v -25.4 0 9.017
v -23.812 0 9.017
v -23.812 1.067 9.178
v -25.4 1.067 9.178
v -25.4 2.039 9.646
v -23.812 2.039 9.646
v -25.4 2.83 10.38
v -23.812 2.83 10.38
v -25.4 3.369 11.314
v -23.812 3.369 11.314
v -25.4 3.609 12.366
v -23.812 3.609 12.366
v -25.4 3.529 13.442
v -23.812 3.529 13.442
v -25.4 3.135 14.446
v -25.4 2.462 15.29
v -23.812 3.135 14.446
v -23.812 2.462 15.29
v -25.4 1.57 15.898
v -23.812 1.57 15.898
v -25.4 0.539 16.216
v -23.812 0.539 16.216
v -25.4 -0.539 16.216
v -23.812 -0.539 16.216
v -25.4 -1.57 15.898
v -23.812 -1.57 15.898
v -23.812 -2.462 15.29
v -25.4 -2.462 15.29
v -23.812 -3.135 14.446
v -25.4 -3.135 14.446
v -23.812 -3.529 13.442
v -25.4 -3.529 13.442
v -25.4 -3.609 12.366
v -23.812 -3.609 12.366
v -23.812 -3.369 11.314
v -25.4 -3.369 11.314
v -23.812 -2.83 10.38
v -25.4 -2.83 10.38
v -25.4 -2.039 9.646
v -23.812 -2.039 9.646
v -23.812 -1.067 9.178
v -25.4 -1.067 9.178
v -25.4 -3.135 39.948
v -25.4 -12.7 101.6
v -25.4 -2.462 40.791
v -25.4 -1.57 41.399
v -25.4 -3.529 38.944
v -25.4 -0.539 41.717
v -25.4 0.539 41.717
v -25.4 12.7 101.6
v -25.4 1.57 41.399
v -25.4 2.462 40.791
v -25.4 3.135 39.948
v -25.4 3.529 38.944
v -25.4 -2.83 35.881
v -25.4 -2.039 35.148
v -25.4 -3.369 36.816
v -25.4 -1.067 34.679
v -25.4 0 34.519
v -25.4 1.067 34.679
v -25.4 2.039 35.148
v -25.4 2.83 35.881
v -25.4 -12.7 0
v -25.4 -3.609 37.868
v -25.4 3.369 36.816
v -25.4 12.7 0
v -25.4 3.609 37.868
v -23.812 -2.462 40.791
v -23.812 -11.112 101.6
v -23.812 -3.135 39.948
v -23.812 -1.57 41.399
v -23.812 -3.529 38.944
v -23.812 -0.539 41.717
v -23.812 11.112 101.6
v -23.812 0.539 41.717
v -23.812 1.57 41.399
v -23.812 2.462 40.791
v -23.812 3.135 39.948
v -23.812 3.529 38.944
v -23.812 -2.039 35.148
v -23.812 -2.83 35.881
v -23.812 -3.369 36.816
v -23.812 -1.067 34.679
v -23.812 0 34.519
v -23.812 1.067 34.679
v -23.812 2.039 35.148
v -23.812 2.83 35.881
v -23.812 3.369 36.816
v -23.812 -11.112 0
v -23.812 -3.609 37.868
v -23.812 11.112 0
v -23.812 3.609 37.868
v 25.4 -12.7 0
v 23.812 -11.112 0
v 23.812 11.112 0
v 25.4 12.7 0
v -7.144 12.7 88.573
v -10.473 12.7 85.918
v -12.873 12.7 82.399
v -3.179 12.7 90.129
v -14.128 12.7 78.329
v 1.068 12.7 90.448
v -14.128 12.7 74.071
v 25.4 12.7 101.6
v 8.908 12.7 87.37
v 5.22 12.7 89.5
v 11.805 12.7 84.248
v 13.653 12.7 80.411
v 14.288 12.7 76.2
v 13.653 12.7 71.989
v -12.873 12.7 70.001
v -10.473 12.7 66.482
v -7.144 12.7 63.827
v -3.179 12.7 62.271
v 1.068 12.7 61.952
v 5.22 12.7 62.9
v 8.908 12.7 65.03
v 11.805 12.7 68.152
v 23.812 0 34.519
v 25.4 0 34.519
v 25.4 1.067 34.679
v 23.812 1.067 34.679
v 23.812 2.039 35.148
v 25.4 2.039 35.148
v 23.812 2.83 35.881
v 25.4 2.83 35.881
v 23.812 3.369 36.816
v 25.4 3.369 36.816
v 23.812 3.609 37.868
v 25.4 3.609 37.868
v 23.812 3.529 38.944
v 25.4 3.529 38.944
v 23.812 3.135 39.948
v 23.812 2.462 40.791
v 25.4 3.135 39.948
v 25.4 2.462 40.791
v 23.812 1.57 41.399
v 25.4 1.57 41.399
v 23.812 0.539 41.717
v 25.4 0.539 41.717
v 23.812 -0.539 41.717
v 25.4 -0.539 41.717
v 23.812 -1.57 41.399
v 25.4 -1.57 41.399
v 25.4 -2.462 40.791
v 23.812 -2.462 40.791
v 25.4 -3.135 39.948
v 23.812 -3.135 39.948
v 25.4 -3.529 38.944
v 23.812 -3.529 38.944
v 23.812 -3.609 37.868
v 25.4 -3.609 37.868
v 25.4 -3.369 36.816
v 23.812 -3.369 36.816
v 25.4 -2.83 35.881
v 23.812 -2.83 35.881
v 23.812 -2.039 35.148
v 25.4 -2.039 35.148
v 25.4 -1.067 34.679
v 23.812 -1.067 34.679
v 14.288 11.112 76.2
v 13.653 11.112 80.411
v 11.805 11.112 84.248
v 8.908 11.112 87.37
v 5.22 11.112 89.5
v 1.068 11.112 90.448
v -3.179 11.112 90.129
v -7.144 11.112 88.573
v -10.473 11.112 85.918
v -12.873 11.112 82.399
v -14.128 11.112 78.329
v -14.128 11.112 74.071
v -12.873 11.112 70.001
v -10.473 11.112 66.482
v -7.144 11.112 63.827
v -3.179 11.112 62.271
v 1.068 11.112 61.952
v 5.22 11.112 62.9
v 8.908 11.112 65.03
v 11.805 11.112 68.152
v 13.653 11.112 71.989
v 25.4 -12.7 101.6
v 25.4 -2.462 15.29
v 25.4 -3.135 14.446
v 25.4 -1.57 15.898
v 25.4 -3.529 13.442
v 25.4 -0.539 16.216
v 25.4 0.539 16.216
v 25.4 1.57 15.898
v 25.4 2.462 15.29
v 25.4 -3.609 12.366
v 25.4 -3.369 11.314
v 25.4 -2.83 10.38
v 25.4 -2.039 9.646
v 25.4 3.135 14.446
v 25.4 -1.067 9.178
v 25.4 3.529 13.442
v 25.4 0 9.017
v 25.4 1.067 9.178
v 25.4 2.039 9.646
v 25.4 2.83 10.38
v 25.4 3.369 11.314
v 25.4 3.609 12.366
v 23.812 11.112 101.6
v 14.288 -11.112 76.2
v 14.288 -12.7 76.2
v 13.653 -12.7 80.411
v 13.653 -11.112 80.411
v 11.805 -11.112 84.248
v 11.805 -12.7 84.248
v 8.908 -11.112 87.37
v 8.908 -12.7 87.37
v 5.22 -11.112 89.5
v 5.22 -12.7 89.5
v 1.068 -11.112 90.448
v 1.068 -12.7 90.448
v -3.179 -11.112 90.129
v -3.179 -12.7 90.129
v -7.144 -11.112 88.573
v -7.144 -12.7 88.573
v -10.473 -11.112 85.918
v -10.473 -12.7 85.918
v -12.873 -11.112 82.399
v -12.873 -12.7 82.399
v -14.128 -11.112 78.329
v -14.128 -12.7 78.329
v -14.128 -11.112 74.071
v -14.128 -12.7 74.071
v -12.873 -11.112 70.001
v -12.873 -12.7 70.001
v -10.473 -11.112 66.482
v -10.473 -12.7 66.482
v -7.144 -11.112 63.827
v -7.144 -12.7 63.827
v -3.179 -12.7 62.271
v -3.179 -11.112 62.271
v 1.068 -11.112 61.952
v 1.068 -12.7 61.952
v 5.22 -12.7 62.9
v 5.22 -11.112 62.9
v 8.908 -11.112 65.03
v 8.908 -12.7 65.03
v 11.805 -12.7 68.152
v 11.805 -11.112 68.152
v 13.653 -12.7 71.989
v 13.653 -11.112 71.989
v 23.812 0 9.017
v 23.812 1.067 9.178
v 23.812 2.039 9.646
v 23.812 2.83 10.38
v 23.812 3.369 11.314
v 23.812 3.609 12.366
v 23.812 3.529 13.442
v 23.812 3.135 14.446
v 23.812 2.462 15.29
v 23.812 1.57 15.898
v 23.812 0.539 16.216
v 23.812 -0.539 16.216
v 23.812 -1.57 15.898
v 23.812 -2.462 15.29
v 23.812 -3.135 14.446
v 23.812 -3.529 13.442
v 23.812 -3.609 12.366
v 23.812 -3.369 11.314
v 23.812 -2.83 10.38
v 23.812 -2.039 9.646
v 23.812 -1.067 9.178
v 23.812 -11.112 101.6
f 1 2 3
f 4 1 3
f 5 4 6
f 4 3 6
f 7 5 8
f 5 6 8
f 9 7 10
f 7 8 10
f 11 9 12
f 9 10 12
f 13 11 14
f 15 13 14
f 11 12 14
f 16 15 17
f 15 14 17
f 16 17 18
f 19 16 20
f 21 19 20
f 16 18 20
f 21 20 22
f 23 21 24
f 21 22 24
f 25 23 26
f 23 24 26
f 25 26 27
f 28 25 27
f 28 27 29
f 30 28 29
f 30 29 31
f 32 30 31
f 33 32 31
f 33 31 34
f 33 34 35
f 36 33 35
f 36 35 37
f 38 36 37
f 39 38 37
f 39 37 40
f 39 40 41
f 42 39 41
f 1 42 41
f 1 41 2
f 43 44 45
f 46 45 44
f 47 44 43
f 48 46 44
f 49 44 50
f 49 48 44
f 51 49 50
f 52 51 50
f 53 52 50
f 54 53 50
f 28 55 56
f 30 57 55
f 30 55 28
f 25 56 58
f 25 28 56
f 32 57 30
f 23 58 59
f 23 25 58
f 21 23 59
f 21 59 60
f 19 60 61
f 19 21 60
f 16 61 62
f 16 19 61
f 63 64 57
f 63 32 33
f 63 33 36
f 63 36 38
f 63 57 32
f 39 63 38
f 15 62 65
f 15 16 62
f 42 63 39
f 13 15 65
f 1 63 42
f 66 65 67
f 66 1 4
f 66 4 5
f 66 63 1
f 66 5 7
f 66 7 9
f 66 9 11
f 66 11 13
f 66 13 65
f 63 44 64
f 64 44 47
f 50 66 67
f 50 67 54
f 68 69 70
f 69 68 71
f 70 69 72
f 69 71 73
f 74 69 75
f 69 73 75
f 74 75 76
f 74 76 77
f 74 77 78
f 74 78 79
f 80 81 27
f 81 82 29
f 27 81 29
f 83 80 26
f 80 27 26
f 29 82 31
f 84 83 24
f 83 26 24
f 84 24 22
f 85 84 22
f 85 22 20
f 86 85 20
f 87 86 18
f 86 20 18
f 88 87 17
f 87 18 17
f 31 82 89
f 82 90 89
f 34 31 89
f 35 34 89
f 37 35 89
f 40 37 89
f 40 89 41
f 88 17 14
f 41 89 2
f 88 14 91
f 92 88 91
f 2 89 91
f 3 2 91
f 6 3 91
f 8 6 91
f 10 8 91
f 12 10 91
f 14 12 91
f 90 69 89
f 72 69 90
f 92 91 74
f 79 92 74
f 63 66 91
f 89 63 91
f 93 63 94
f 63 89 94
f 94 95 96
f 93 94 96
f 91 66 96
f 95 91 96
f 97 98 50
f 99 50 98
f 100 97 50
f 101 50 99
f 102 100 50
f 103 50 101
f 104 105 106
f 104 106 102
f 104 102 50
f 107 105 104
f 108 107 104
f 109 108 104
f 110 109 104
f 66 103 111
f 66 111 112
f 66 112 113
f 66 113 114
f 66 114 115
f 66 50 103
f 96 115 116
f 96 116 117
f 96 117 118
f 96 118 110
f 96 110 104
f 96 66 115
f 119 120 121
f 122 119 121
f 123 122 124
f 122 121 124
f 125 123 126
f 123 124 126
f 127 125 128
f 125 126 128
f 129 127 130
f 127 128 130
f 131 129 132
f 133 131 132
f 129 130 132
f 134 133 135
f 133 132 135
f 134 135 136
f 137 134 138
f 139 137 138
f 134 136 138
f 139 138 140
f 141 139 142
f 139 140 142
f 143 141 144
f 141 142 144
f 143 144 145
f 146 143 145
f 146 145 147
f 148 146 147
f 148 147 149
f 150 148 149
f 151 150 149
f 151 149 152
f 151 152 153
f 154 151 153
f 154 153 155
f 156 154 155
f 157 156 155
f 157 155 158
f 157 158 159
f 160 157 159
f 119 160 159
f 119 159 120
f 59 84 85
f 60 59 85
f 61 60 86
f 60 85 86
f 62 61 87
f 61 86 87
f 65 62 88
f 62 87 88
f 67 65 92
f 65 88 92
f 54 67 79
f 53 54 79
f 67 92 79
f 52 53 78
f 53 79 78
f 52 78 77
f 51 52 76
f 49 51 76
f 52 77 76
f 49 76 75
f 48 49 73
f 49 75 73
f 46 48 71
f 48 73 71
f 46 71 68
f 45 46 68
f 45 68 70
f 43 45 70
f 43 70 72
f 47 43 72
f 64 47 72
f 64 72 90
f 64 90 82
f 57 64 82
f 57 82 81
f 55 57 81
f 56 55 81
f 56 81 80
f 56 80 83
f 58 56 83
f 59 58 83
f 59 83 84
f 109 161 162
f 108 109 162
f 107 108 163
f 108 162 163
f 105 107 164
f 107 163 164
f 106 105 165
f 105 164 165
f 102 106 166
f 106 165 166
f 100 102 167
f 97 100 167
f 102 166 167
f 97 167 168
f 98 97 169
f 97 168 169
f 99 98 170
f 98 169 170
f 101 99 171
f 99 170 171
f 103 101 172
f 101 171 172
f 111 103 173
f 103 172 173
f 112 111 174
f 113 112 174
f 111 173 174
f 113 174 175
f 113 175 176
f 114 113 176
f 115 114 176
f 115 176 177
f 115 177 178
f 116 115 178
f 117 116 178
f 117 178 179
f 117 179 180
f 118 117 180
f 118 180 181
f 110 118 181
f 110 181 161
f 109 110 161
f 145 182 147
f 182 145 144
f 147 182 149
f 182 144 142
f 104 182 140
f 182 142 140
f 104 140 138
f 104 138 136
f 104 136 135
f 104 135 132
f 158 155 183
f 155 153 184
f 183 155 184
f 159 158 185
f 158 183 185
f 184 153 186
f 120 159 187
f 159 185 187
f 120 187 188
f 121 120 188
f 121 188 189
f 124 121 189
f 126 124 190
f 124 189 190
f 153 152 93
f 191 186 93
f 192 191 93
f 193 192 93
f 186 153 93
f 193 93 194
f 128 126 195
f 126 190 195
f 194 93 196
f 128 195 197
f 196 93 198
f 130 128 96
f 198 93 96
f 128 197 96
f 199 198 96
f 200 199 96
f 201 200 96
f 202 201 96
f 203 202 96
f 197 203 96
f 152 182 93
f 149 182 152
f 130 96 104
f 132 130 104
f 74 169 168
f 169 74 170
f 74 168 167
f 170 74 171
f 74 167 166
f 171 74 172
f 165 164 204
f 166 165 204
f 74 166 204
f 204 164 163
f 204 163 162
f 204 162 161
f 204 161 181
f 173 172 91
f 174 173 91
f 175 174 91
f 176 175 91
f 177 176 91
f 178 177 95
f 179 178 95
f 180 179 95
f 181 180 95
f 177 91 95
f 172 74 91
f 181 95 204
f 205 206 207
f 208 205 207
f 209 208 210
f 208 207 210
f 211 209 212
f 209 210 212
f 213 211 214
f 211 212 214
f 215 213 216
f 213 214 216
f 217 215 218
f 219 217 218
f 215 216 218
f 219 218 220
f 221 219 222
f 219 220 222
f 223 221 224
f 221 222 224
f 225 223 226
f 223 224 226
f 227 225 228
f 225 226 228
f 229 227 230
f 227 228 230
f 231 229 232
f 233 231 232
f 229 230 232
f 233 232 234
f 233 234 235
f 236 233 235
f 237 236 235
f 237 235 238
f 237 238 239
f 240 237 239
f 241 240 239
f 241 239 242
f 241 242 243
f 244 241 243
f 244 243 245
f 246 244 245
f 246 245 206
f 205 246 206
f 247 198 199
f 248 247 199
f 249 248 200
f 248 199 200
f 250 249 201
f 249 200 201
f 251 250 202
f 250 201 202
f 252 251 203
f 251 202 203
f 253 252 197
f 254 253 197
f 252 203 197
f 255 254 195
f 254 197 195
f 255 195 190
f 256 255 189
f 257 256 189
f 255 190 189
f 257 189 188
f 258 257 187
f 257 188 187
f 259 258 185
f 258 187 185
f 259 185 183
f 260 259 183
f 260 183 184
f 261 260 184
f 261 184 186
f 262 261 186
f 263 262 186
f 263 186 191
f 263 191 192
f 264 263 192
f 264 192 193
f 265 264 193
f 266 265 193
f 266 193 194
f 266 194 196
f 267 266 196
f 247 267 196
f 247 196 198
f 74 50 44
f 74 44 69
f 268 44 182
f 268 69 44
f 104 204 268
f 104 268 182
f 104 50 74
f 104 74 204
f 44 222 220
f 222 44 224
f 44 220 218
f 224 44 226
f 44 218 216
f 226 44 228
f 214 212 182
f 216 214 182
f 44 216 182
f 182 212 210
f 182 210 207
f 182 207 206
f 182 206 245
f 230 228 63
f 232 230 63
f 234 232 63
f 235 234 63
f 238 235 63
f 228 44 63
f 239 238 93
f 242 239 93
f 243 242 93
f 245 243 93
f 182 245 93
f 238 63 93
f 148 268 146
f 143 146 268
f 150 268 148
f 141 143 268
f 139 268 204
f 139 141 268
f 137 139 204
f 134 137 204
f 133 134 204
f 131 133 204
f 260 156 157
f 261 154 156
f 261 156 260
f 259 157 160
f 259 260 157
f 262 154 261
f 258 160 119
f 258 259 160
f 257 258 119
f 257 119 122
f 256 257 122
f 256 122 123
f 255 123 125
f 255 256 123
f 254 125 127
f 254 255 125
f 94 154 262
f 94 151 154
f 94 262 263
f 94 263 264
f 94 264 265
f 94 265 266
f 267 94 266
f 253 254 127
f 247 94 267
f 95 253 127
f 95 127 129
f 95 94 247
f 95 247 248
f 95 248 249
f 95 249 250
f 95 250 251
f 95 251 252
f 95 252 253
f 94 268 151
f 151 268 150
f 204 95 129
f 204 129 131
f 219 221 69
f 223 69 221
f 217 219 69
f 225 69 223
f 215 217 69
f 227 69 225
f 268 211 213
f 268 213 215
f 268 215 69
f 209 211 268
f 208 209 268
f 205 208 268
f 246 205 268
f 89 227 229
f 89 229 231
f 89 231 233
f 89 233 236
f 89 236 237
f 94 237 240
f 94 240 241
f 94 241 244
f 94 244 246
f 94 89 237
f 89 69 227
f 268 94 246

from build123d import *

# Parameters (mm, degrees)
SKETCH1_W               = 50.8
SKETCH1_H               = 25.4
SKETCH1_W_2             = 47.625
SKETCH1_H_2             = 22.225
BOSS_EXTRUDE1_DEPTH     = 101.6
SKETCH2_R               = 14.2875
CUT_EXTRUDE1_DEPTH      = 26.4
SKETCH3_R               = 3.6195
CUT_EXTRUDE2_DEPTH      = 1
CUT_EXTRUDE2_DEPTH_BACK = 51.8


with BuildPart() as part:
    # Sketch1 → Boss-Extrude1 (new body)
    with BuildSketch(Plane.XY):
        Rectangle(SKETCH1_W, SKETCH1_H)
        Rectangle(SKETCH1_W_2, SKETCH1_H_2, mode=Mode.SUBTRACT)
    extrude(amount=BOSS_EXTRUDE1_DEPTH)

    # Sketch2 → Cut-Extrude1 (cut, through all)
    with BuildSketch(Plane.XZ.offset(12.7)):
        with Locations((0, 76.2)):
            Circle(SKETCH2_R)
    extrude(amount=-CUT_EXTRUDE1_DEPTH, mode=Mode.SUBTRACT)

    # Sketch3 → Cut-Extrude2 (cut, two sides)
    with BuildSketch(Plane(origin=(25.4, 0, 0), x_dir=(0, 0, -1), z_dir=(1, 0, 0))) as cut_extrude2_sk:
        with Locations((-38.1381, 0)):
            Circle(SKETCH3_R)
        with Locations((-12.6365, 0)):
            Circle(SKETCH3_R)
    extrude(amount=CUT_EXTRUDE2_DEPTH, mode=Mode.SUBTRACT)
    extrude(cut_extrude2_sk.sketch, amount=-CUT_EXTRUDE2_DEPTH_BACK, mode=Mode.SUBTRACT)


solid = part.part
